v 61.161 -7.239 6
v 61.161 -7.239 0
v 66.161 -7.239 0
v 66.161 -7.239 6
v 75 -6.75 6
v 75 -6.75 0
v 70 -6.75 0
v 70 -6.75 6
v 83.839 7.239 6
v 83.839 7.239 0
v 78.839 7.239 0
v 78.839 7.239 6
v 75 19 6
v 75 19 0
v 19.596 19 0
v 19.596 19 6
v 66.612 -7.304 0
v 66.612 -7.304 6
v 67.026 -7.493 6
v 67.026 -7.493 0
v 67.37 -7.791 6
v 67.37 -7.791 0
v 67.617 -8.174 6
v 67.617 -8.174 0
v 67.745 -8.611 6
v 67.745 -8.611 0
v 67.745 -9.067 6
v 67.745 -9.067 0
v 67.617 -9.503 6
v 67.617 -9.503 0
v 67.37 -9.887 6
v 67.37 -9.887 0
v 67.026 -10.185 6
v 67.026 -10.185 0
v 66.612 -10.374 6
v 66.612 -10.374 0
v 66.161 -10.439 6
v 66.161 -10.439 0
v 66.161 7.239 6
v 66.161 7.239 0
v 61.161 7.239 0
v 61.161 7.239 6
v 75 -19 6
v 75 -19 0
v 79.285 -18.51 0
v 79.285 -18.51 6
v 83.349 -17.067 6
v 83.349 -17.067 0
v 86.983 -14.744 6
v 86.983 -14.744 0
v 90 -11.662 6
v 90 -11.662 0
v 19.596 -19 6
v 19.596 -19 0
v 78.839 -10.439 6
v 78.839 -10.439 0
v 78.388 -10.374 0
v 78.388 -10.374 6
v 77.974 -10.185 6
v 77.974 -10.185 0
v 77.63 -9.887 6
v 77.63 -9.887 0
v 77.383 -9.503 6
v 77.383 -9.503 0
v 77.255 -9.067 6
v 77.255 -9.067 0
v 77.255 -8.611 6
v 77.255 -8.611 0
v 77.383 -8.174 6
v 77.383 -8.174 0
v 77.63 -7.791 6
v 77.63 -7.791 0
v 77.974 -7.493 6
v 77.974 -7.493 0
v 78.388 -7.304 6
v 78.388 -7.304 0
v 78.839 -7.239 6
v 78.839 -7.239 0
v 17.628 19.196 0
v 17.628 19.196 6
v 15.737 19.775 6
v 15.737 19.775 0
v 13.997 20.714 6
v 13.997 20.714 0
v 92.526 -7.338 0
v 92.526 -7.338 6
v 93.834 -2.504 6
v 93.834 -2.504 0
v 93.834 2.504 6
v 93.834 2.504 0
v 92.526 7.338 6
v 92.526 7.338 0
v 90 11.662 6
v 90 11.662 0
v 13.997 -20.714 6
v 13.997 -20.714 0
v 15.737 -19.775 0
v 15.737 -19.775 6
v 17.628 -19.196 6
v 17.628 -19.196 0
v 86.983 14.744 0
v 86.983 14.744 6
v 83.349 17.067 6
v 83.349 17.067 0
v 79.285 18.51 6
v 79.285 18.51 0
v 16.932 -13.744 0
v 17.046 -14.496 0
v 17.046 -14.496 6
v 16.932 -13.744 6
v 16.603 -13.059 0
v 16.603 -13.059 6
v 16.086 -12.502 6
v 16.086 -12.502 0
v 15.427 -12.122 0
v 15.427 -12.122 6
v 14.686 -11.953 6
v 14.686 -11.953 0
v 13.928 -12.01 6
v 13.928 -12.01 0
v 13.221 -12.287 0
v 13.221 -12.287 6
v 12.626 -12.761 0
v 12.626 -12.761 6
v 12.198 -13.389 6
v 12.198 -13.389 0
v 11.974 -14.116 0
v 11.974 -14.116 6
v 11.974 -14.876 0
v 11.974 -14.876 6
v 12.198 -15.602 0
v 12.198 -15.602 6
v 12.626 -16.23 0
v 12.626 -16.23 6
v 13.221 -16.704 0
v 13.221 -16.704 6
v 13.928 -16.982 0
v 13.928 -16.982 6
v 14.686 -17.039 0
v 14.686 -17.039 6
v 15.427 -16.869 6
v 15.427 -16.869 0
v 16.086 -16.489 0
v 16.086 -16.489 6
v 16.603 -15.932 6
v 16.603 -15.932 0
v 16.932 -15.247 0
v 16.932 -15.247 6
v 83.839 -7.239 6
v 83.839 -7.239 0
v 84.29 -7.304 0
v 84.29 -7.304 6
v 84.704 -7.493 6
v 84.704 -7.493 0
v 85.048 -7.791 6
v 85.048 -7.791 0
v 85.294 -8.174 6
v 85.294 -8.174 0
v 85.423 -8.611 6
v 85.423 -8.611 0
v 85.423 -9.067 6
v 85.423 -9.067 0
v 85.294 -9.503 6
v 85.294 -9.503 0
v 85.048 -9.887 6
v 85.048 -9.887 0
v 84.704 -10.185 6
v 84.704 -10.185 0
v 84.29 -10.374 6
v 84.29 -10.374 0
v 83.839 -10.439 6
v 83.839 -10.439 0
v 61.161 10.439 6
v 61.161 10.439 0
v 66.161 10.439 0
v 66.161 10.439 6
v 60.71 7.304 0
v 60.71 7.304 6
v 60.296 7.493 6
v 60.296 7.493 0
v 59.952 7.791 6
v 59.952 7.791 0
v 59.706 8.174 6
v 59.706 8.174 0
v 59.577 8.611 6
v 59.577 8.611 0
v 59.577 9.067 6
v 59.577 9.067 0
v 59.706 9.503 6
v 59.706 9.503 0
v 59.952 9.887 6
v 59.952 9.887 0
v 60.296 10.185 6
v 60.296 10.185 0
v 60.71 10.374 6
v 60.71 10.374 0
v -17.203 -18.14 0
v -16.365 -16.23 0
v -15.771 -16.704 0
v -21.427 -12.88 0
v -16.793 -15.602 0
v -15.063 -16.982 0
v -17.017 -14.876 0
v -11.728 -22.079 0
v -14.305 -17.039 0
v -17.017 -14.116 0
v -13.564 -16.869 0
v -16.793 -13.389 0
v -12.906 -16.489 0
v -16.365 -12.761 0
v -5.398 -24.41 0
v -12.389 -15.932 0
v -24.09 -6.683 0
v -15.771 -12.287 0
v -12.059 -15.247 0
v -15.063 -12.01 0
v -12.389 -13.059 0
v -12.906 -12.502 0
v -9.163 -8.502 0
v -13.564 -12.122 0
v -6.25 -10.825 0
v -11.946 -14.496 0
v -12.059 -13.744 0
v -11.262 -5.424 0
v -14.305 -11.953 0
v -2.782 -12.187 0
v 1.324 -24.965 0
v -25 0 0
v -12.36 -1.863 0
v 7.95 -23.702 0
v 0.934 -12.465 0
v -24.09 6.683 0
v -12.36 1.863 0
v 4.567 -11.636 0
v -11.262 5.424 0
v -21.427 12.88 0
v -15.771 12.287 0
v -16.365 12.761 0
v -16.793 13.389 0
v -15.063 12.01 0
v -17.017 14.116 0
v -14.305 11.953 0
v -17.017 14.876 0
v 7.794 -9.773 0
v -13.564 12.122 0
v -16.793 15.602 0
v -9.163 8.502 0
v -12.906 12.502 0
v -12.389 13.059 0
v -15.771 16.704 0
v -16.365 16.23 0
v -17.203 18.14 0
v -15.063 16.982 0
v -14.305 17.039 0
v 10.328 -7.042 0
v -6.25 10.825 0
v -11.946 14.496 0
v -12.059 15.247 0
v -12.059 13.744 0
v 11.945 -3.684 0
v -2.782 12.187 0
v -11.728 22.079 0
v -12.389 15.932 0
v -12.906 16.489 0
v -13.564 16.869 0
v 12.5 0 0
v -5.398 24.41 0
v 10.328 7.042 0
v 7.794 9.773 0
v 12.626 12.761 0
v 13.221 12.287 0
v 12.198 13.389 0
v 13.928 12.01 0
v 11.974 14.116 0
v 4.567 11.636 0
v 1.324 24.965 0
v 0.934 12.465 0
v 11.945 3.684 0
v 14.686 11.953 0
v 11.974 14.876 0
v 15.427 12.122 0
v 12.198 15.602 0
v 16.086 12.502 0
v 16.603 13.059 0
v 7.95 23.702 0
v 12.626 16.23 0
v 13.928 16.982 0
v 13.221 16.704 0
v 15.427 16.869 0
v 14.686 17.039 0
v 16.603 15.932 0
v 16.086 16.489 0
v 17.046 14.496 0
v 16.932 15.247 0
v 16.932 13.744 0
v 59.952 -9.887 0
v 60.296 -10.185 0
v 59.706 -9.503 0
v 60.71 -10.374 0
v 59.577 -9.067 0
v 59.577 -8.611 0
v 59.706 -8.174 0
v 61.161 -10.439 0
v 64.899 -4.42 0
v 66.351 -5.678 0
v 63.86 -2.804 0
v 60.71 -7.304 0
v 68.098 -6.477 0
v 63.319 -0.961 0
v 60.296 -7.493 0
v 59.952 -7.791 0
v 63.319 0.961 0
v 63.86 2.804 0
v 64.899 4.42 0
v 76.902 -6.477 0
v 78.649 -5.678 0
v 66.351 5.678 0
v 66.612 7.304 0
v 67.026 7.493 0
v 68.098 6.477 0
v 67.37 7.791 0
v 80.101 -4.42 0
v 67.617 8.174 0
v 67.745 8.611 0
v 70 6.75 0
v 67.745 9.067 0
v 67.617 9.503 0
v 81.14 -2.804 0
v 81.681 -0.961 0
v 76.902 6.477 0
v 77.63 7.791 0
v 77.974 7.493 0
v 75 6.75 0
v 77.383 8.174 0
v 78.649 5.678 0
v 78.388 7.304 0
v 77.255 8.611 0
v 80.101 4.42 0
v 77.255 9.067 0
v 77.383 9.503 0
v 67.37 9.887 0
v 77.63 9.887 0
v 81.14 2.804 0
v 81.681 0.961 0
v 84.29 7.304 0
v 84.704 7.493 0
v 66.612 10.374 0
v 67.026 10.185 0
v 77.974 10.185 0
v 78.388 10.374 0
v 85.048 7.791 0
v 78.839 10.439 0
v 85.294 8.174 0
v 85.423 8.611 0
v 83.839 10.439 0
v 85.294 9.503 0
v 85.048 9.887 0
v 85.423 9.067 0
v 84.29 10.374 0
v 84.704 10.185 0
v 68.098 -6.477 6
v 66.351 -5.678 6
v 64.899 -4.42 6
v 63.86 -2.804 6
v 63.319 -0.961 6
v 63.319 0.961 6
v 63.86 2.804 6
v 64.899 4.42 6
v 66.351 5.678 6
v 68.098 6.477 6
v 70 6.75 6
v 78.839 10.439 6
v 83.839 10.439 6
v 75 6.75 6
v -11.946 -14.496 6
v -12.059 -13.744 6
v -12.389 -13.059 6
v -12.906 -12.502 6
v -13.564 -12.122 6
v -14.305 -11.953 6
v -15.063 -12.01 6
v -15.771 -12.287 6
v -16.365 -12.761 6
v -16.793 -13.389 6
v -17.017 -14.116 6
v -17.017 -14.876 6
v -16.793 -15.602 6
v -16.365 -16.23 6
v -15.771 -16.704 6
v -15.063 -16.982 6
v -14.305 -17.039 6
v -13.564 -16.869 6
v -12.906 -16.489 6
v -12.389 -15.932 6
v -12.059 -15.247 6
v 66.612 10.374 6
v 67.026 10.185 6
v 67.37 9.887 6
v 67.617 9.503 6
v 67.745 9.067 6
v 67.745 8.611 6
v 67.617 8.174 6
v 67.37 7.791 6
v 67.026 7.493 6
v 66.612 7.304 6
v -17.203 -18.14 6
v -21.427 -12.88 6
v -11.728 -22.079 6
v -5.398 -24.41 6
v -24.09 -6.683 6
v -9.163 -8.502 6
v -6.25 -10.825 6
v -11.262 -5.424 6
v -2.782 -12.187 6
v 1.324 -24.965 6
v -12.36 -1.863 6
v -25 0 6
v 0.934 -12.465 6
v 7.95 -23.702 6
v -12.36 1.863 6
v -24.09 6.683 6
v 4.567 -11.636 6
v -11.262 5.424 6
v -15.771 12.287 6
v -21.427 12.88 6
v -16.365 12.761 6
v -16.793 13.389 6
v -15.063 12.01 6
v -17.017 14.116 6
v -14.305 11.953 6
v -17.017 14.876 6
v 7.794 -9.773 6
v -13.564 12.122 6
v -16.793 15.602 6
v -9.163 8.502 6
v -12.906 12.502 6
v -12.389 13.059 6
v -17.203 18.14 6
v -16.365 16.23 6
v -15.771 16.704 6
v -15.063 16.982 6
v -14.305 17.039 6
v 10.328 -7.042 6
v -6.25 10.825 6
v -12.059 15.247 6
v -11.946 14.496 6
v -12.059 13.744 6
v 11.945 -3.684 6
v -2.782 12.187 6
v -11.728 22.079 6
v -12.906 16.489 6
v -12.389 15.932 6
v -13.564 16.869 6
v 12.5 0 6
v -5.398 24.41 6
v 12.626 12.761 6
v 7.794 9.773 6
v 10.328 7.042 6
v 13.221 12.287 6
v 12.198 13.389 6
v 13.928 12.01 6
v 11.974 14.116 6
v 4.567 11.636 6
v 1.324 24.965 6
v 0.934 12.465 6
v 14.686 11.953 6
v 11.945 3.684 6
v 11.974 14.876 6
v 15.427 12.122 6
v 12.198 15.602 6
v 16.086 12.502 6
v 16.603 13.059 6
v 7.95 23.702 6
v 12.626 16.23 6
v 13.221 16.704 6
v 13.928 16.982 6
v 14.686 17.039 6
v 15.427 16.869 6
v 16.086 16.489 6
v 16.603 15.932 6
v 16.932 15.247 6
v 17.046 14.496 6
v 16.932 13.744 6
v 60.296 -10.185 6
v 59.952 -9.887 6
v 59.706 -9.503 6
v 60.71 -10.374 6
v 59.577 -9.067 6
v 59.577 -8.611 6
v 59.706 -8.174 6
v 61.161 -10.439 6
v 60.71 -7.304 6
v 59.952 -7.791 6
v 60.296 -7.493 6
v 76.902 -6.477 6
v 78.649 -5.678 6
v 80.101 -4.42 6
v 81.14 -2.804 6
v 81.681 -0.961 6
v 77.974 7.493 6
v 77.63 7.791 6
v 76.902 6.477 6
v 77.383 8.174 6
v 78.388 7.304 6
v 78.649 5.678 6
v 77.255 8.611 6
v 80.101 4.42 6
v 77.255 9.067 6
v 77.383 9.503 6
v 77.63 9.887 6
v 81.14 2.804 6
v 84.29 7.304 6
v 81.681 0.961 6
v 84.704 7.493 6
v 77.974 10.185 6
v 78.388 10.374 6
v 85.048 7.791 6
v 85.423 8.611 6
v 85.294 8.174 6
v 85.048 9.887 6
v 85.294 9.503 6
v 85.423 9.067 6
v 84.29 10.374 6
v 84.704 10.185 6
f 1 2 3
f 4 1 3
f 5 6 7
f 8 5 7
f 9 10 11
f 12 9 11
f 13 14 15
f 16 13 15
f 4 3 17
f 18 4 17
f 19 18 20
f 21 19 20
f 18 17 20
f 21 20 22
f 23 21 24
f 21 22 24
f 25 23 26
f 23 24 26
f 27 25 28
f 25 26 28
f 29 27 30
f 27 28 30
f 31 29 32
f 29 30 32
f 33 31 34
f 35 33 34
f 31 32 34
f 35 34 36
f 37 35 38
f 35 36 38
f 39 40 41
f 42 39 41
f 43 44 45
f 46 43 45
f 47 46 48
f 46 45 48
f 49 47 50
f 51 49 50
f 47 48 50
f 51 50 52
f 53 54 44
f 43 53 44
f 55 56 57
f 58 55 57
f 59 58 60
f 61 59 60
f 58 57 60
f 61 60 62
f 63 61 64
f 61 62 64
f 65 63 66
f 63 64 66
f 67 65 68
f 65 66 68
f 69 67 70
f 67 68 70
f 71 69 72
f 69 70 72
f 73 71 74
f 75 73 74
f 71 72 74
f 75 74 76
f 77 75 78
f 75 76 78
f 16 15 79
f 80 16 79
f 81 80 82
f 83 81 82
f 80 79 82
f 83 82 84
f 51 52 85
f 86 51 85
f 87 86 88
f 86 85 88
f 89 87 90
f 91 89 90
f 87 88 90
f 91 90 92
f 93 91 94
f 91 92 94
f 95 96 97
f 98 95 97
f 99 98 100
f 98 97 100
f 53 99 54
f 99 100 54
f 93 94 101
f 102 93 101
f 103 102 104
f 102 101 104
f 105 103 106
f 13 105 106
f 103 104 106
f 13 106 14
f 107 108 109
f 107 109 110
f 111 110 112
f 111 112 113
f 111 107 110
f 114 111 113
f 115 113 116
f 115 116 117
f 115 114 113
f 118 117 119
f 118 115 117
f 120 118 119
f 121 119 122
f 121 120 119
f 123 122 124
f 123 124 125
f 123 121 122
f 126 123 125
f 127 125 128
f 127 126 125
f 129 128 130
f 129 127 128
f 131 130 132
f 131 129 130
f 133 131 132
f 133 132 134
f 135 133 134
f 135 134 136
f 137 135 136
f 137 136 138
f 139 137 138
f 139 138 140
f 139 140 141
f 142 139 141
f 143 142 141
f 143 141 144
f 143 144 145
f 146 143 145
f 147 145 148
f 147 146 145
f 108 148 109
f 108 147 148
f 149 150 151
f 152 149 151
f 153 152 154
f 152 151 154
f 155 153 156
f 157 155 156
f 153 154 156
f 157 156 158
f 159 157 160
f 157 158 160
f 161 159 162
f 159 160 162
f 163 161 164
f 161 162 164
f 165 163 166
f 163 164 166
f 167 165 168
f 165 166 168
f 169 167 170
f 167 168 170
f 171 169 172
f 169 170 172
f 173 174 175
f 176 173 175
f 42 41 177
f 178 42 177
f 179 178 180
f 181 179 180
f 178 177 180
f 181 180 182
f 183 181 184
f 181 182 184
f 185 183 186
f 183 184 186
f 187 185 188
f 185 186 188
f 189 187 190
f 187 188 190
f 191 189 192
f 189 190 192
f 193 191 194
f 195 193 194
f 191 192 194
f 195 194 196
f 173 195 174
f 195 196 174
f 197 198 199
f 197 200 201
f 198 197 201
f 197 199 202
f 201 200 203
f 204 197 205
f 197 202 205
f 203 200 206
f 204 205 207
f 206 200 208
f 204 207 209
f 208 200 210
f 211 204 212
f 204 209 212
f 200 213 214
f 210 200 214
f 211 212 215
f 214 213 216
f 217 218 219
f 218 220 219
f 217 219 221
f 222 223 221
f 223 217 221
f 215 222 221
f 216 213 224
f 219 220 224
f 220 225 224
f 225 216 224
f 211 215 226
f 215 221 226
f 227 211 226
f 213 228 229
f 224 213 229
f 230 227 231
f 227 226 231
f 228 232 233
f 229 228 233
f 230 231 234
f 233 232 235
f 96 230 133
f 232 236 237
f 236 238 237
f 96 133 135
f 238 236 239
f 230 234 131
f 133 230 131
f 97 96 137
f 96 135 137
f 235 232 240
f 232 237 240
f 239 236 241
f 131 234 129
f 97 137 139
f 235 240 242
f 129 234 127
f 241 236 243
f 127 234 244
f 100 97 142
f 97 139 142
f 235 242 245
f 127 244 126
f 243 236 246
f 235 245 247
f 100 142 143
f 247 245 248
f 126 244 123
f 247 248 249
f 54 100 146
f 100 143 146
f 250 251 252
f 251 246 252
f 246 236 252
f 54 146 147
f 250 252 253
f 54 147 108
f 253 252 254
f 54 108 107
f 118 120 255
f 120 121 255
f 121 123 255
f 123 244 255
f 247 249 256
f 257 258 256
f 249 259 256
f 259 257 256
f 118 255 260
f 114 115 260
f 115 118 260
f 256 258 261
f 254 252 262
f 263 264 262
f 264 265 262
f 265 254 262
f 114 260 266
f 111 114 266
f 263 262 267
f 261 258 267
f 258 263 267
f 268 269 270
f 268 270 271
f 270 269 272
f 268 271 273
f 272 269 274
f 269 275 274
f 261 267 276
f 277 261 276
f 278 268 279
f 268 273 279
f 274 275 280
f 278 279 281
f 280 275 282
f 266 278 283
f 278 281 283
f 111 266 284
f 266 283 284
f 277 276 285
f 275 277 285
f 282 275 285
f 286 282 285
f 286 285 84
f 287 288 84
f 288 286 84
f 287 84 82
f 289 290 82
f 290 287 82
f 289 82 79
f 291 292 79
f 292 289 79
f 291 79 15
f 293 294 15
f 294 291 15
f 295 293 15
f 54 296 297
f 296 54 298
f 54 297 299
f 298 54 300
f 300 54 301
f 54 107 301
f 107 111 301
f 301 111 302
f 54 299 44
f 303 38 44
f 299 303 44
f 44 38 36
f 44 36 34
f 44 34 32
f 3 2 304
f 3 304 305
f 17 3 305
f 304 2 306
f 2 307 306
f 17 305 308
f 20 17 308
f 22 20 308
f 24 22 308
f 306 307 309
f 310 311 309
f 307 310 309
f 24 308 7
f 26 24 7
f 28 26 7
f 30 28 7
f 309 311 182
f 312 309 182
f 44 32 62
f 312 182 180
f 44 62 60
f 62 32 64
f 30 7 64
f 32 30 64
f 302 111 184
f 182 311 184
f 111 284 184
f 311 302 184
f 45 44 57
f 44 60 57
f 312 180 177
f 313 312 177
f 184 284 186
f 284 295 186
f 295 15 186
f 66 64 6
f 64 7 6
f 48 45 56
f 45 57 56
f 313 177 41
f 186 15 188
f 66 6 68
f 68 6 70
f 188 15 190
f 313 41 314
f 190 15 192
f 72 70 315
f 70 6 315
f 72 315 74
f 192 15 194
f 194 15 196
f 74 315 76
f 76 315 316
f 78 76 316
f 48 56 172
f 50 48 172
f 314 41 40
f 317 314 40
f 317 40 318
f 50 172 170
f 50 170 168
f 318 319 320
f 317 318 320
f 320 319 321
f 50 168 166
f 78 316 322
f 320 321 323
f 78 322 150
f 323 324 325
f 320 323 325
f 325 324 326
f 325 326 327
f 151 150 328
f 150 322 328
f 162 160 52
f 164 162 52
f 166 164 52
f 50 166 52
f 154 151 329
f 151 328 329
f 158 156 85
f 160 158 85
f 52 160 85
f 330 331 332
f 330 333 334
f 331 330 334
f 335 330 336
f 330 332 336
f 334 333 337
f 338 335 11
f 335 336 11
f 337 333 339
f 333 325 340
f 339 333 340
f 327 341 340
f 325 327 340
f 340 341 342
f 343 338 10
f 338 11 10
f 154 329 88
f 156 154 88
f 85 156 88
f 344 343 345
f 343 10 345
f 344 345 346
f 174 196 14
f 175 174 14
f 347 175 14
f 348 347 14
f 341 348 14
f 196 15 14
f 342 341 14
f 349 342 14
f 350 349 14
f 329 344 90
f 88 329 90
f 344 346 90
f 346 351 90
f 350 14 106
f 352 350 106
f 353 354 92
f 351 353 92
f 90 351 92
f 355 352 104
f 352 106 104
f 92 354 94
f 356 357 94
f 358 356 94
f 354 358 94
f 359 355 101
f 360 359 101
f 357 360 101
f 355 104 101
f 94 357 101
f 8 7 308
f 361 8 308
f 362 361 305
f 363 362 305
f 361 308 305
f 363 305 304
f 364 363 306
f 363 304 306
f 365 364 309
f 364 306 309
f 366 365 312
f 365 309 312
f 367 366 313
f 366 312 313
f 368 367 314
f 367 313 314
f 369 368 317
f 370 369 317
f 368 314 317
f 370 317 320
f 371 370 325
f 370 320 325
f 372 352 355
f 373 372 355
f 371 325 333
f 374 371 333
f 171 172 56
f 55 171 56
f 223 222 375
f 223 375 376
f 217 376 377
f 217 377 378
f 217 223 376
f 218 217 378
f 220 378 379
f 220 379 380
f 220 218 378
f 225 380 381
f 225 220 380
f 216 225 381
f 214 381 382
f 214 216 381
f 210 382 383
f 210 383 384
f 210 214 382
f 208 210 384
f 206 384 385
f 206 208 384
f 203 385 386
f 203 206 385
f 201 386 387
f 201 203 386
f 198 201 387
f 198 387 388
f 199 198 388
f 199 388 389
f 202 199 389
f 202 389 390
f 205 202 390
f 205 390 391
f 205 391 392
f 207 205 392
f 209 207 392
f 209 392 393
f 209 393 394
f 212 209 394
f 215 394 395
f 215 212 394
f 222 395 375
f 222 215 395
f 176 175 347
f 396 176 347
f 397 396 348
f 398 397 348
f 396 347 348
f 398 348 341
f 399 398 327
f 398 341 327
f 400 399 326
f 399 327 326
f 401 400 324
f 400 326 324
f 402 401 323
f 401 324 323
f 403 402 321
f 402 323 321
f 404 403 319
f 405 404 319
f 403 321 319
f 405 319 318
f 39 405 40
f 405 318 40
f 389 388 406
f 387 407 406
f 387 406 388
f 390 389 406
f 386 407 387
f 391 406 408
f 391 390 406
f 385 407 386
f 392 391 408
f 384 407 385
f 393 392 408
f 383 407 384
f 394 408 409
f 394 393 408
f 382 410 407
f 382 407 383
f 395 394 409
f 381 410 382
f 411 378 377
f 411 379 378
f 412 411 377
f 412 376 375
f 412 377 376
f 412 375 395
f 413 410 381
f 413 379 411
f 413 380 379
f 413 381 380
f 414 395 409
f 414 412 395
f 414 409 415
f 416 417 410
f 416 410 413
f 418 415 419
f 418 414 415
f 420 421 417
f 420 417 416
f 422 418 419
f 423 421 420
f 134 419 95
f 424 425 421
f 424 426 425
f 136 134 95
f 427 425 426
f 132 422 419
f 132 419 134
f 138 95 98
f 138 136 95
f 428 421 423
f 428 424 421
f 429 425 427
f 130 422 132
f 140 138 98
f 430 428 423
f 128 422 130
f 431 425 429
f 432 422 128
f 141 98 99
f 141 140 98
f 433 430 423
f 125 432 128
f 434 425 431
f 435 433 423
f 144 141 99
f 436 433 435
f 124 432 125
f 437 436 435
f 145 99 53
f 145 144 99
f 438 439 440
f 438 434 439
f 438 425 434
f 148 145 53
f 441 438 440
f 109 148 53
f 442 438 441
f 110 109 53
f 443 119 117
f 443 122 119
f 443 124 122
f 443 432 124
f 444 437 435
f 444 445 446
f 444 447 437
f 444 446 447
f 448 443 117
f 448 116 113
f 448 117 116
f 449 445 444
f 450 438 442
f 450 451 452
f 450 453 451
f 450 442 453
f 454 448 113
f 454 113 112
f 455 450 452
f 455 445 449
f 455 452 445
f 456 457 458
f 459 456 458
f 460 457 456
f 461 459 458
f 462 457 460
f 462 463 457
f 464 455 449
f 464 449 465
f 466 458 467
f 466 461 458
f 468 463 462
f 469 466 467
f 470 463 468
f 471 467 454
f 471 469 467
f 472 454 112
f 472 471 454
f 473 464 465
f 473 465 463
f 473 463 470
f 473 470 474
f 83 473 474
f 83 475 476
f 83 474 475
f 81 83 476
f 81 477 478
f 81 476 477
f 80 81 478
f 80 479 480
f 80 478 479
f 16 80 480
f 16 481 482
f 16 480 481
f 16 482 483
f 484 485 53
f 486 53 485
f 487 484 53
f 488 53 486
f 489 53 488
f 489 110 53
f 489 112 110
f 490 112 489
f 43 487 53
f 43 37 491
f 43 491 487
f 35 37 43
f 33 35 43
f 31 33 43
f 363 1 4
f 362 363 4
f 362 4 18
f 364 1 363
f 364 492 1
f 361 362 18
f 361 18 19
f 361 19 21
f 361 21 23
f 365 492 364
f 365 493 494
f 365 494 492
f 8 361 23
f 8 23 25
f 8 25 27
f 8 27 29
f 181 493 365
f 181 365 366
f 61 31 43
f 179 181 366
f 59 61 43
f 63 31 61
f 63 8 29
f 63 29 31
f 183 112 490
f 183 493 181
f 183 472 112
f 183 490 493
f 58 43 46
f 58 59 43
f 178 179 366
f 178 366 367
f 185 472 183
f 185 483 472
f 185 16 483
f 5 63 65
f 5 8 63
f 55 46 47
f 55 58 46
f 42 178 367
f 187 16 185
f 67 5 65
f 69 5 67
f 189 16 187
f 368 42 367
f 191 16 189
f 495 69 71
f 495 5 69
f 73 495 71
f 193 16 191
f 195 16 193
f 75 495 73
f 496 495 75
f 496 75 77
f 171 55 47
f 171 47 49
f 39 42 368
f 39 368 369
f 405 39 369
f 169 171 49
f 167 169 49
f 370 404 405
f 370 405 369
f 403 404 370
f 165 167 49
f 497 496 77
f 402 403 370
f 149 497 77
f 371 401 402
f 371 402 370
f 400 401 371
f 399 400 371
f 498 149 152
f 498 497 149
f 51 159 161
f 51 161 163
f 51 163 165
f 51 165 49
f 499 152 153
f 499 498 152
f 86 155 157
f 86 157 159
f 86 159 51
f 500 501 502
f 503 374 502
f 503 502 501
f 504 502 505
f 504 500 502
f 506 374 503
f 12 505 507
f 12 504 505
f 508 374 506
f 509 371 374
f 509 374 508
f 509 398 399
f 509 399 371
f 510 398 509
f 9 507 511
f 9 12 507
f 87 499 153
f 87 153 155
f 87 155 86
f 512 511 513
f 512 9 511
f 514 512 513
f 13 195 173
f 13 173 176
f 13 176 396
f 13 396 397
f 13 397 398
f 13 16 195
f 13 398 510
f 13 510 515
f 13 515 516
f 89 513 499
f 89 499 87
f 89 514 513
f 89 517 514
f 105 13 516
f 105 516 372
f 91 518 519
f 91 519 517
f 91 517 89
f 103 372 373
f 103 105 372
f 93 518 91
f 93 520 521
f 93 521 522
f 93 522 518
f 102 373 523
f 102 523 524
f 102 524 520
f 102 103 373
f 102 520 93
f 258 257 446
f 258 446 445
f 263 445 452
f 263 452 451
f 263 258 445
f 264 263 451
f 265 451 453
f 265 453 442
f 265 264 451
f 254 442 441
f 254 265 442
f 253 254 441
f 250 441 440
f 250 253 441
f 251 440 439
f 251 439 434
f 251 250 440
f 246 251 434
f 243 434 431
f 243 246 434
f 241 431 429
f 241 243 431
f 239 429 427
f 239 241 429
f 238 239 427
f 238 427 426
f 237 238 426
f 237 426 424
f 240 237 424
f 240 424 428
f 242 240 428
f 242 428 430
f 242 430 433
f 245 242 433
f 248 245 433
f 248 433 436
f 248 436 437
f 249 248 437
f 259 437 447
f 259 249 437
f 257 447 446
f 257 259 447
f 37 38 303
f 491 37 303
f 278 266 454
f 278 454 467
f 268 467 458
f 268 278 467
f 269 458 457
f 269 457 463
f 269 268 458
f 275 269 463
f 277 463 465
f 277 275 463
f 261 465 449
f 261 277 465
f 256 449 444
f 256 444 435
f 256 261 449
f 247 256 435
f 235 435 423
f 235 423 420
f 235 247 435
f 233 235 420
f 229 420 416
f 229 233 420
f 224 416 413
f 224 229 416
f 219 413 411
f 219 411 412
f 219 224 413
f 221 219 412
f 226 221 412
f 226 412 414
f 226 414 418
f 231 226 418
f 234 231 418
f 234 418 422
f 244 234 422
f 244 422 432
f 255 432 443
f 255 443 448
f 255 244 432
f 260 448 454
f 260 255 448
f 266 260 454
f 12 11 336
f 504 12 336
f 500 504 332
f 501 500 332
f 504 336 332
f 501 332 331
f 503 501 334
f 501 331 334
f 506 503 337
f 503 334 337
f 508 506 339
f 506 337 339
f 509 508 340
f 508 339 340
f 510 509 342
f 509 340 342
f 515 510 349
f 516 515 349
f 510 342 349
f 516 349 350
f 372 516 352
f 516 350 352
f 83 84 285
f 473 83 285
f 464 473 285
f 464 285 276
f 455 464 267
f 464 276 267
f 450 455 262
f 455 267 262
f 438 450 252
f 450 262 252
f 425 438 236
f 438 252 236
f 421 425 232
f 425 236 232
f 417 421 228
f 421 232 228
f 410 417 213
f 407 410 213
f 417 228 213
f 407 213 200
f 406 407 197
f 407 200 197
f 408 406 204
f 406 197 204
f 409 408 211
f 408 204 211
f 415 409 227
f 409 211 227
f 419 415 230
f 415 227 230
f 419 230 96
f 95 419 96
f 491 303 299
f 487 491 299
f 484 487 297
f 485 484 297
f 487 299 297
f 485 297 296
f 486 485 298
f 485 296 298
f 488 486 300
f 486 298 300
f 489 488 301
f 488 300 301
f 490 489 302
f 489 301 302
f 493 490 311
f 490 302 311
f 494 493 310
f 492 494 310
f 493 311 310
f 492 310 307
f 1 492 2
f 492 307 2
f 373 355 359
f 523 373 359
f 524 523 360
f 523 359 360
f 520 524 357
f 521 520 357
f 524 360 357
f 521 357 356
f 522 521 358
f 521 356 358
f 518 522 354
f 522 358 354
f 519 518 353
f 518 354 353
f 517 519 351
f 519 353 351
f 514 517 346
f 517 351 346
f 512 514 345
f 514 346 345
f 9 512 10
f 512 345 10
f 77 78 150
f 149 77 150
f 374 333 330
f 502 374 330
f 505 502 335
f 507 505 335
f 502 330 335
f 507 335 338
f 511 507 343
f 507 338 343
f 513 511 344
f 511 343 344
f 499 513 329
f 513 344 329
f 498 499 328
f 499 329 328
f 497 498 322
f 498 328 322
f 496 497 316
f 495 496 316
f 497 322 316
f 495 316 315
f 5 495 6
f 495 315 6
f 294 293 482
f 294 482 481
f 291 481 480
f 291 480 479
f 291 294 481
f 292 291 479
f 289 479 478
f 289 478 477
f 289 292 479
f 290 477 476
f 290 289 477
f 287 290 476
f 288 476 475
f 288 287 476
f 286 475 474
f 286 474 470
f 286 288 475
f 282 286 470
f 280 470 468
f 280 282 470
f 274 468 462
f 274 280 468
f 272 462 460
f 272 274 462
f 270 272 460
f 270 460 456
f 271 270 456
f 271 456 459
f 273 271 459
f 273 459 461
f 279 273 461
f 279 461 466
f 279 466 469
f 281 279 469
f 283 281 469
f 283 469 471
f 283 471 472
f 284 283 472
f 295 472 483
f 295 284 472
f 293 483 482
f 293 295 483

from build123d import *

# Parameters (mm, degrees)
F0_R     = 2.55
F0_R_2   = 12.5
F1_DEPTH = 6


with BuildPart() as f1:
    # F0 (on Top) → F1 (new body)
    with BuildSketch(Plane.XY):
        with BuildLine():
            ThreePointArc((19.5959179423, 19), (16.6682177234, 19.4381711253), (13.9970842445, 20.7142857143))
            ThreePointArc((13.9970842445, 20.7142857143), (-25, 0), (13.9970842445, -20.7142857143))
            ThreePointArc((13.9970842445, -20.7142857143), (16.6682177234, -19.4381711253), (19.5959179423, -19))
            Line((19.5959179423, -19), (75, -19))
            ThreePointArc((75, -19), (83.3493660836, -17.0671639707), (90, -11.6619037897))
            Line((90, -11.6619037897), (90, 11.6619037897))
            ThreePointArc((90, 11.6619037897), (83.3493660836, 17.0671639707), (75, 19))
            Line((75, 19), (19.5959179423, 19))
        make_face()
        with Locations((-14.4956890143, -14.4956890143)):
            Circle(F0_R, mode=Mode.SUBTRACT)
        with Locations((14.4956890143, -14.4956890143)):
            Circle(F0_R, mode=Mode.SUBTRACT)
        with BuildLine():
            ThreePointArc((61.1611652352, -10.4388347648), (59.5611652352, -8.8388347648), (61.1611652352, -7.2388347648))
            Line((61.1611652352, -7.2388347648), (66.1611652352, -7.2388347648))
            ThreePointArc((66.1611652352, -7.2388347648), (67.7611652352, -8.8388347648), (66.1611652352, -10.4388347648))
            Line((66.1611652352, -10.4388347648), (61.1611652352, -10.4388347648))
        make_face(mode=Mode.SUBTRACT)
        with BuildLine():
            ThreePointArc((78.8388347648, -10.4388347648), (77.2388347648, -8.8388347648), (78.8388347648, -7.2388347648))
            Line((78.8388347648, -7.2388347648), (83.8388347648, -7.2388347648))
            ThreePointArc((83.8388347648, -7.2388347648), (85.4388347648, -8.8388347648), (83.8388347648, -10.4388347648))
            Line((83.8388347648, -10.4388347648), (78.8388347648, -10.4388347648))
        make_face(mode=Mode.SUBTRACT)
        Circle(F0_R_2, mode=Mode.SUBTRACT)
        with Locations((-14.4956890143, 14.4956890143)):
            Circle(F0_R, mode=Mode.SUBTRACT)
        with Locations((14.4956890143, 14.4956890143)):
            Circle(F0_R, mode=Mode.SUBTRACT)
        with BuildLine():
            ThreePointArc((61.1611652352, 7.2388347648), (59.5611652352, 8.8388347648), (61.1611652352, 10.4388347648))
            Line((61.1611652352, 10.4388347648), (66.1611652352, 10.4388347648))
            ThreePointArc((66.1611652352, 10.4388347648), (67.7611652352, 8.8388347648), (66.1611652352, 7.2388347648))
            Line((66.1611652352, 7.2388347648), (61.1611652352, 7.2388347648))
        make_face(mode=Mode.SUBTRACT)
        with BuildLine():
            ThreePointArc((70, -6.75), (63.25, 0), (70, 6.75))
            Line((70, 6.75), (75, 6.75))
            ThreePointArc((75, 6.75), (81.75, 0), (75, -6.75))
            Line((75, -6.75), (70, -6.75))
        make_face(mode=Mode.SUBTRACT)
        with BuildLine():
            ThreePointArc((78.8388347648, 7.2388347648), (77.2388347648, 8.8388347648), (78.8388347648, 10.4388347648))
            Line((78.8388347648, 10.4388347648), (83.8388347648, 10.4388347648))
            ThreePointArc((83.8388347648, 10.4388347648), (85.4388347648, 8.8388347648), (83.8388347648, 7.2388347648))
            Line((83.8388347648, 7.2388347648), (78.8388347648, 7.2388347648))
        make_face(mode=Mode.SUBTRACT)
        with BuildLine():
            ThreePointArc((90, -11.6619037897), (94, 0), (90, 11.6619037897))
            Line((90, 11.6619037897), (90, -11.6619037897))
        make_face()
    extrude(amount=F1_DEPTH)


solid = f1.part
